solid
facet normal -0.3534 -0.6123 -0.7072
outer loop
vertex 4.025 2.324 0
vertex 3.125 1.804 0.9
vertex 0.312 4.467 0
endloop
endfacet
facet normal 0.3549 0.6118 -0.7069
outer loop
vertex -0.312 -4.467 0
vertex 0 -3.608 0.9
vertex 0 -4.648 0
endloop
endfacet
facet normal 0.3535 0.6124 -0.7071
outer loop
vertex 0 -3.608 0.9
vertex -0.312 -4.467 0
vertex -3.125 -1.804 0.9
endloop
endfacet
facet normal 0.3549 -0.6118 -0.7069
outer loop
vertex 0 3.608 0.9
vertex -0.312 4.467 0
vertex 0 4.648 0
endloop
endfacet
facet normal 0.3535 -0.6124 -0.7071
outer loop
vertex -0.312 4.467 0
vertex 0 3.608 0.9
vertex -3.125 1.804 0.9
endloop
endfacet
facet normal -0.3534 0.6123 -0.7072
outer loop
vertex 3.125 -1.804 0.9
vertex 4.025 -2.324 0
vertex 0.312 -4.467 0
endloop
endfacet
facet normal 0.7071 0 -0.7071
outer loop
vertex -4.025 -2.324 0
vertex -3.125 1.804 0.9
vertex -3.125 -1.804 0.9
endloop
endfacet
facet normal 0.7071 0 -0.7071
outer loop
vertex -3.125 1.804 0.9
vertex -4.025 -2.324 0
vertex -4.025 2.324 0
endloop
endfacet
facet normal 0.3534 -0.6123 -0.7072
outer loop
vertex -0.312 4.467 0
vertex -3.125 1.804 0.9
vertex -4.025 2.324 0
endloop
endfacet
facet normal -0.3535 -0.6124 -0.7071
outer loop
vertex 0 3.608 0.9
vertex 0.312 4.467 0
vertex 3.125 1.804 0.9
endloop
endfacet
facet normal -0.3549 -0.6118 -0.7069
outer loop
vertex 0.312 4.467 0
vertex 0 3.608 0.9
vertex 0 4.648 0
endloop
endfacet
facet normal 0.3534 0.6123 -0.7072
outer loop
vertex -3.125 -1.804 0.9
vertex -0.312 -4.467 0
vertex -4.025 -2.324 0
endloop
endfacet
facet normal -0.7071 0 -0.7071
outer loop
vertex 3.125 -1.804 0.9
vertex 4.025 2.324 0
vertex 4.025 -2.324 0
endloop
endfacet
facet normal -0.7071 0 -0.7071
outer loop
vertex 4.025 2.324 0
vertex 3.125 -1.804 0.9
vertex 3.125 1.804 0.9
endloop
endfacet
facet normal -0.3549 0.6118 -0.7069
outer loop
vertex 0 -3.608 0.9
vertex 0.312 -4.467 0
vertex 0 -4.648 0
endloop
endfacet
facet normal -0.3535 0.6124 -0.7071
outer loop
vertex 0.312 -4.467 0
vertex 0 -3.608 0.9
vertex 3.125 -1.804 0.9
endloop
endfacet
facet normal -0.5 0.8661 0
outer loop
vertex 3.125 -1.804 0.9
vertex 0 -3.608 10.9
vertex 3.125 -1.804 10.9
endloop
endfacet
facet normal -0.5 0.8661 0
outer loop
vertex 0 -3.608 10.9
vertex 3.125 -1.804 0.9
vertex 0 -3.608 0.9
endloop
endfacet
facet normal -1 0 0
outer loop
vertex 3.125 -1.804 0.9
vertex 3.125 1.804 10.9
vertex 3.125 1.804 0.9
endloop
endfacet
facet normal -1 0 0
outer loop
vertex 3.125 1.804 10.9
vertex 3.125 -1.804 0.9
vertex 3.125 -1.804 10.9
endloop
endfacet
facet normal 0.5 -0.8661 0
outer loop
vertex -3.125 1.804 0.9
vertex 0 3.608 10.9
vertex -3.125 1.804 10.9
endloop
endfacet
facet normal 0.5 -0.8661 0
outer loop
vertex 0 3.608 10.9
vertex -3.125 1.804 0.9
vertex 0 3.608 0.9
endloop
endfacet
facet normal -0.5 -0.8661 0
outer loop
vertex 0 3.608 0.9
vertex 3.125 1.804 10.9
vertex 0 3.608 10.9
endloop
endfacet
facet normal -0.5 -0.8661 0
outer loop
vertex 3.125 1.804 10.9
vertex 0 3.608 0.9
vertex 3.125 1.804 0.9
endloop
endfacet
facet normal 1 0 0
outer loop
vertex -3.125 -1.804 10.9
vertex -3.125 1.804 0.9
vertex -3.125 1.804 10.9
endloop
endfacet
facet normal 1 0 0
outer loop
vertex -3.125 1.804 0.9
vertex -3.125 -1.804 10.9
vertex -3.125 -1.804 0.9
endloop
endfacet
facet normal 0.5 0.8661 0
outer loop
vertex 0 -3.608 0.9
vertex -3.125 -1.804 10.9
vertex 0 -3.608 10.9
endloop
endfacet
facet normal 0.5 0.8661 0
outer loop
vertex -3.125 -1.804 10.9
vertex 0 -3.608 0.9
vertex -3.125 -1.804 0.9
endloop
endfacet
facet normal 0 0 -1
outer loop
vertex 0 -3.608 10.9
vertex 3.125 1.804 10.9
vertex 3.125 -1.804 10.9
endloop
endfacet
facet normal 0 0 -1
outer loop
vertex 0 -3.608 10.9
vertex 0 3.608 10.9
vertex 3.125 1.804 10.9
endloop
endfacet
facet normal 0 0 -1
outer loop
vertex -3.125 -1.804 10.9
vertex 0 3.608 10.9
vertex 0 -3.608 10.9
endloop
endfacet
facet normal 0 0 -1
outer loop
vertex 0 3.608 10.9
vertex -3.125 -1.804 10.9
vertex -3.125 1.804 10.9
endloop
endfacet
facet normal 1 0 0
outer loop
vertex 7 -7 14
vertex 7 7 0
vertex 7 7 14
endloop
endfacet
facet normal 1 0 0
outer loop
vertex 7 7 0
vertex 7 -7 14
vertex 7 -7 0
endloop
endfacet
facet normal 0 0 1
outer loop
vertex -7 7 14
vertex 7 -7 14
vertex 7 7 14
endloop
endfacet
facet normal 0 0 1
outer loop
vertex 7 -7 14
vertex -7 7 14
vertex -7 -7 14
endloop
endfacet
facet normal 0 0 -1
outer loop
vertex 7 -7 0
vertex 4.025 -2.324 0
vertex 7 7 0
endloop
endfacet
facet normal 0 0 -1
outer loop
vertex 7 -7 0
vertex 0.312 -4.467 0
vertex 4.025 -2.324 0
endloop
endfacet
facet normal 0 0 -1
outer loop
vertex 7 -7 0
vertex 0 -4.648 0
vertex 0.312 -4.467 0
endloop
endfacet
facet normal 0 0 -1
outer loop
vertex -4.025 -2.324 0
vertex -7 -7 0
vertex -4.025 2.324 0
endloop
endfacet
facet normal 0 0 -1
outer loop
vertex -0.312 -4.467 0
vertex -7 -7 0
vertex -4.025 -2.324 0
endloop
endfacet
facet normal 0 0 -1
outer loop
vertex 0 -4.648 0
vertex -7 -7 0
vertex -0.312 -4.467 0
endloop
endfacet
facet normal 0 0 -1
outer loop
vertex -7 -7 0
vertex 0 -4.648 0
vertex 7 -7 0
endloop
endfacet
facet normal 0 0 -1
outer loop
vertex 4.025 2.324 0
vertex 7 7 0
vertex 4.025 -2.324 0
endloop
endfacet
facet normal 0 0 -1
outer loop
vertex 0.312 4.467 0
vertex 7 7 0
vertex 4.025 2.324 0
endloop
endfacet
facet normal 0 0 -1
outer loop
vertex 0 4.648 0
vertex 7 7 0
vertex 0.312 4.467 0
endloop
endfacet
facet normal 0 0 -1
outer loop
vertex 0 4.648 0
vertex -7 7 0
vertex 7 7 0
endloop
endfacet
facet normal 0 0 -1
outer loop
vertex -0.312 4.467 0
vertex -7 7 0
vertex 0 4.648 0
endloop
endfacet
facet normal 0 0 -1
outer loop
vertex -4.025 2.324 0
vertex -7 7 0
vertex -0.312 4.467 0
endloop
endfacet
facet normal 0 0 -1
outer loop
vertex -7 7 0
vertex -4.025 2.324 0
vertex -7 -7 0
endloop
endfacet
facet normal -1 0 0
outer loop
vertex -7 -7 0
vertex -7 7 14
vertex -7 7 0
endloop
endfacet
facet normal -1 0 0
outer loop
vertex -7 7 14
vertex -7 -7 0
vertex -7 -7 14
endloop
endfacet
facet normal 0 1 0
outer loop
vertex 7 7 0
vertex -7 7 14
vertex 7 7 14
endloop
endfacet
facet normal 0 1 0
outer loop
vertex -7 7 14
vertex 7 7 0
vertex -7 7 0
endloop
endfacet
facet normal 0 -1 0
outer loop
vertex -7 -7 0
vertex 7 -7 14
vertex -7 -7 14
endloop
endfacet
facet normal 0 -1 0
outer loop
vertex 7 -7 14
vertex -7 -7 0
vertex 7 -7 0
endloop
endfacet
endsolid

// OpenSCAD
// file: ../utilities/functions_ext.scad
// Funciones sacadas de otras librerías y de diferentes autores

include <constants_oblomobka.scad>

/* A circular helix of radius a and pitch 2πb is described by the following parametrisation:
x(t) = a*cos(t),
y(t) = a*sin(t),
z(t) = b*t
Licensed under the MIT license.
© 2010 by Elmo Mäntynen
*/
function b(pitch) = pitch/(TAU);
function t(pitch, z) = z/b(pitch);
function helix_curve(pitch, radius, z) = [radius*cos(deg(t(pitch, z))), radius*sin(deg(t(pitch, z))), z];


/* Utility functions.
 * Originally by Hans Häggström, 2010.
 * Dual licenced under Creative Commons Attribution-Share Alike 3.0 and LGPL2 or later
 */
function distance(a, b) = sqrt( (a[0] - b[0])*(a[0] - b[0]) +
                                (a[1] - b[1])*(a[1] - b[1]) +
                                (a[2] - b[2])*(a[2] - b[2]) );

function length2(a) = sqrt( a[0]*a[0] + a[1]*a[1] );

function normalized(a) = a / (max(distance([0,0,0], a), 0.00001));

function normalized_axis(a) = 	a == "x" ? [1, 0, 0]:
                  			 	a == "y" ? [0, 1, 0]:
                   				a == "z" ? [0, 0, 1]: normalized(a);

function angleOfNormalizedVector(n) = [0, -atan2(n[2], length2([n[0], n[1]])), atan2(n[1], n[0]) ];

function angle(v) = angleOfNormalizedVector(normalized(v));

function angleBetweenTwoPoints(a, b) = angle(normalized(b-a));
// file: ../utilities/shapes_oblomobka.scad
// Shapes
// (C) @oblomobka - 2014
// GPL3

include <constants_oblomobka.scad>
include <functions_oblomobka.scad>
include <functions_ext.scad>

use <transformations_oblomobka.scad>

// --- Piramide con base circunscrita en un círculo definido en las variables
module pyramid_circumscribed (	n=4,			// nº lados de la base de la pirámide	
								d1=20,		// diámetro del círculo-base donde se circunscribe la pirámide
								d2=0,		// diámetro del círculo-punta donde se circunscribe la pirámide
								h=10			// altura de la pirámide
								){

if(n%2==0){
	rotate([0,0,180/n])
		cylinder (r1=d1/2/cos(180/n), r2=d2/2/cos(180/n), h=h, $fn=n);
	}
	else{
		rotate([0,0,90/n])
			cylinder (r1=d1/2/cos(180/n), r2=d2/2/cos(180/n), h=h, $fn=n);
		}

}
// ------- pyramid_circumscribed (n=n,d1=d1,d2=d2,h=h); -----------------

// --- Prisma con base circunscrita en un círculo definido en las variables
module prism_circumscribed (	n=4,			// nº lados de la base del prisma
							d=20,		// diámetro del círculo donde se circunscribe el prisma
							h=10			// altura del prisma
							){
if(n%2==0){
	rotate([0,0,180/n])
		cylinder (r=d/2/cos(180/n), h=h, $fn=n);
	}
	else{
		rotate([0,0,90/n])
			cylinder (r=d/2/cos(180/n), h=h, $fn=n);
		}
}
// ------- prism_circumscribed (n=n,d=d,h=h); -----------------



// Toros

// Definido por el diámetro exterior y el diámetro del círculo en revolución
module torusOD (d1,d2,resolution){
$fn=resolution;	
rotate_extrude(){
	translate([d1/2-d2/2,0,0])
		circle(r=d2/2);
	}
}

// Definido por el diámetro exterior y el diámetro interior
module torusOI (d1,d2,resolution){
$fn=resolution;	
d=(d1-d2)/2;
rotate_extrude(){
	translate([d1/2-d/2,0,0])
		circle(r=d/2);
	}
}

// Definido por el diámetro de la línea neutra y el diámetro del círculo en revolución
module torusND (d1,d2,resolution){
$fn=resolution;	
rotate_extrude(){
	translate([d1/2,0,0])
		circle(r=d2/2);
	}
}

module torus_sector(d1,d2,angle=360,mode=1,extreme=true,resolution=32){

if(angle<=0 || angle>=360){
	if(mode==1){torusOD(d1,d2,resolution=resolution);}
	else{if(mode==2){torusND(d1,d2,resolution=resolution);}
	else{if(mode==3){torusOI(d1,d2,resolution=resolution);}}}
	}

else{
	if(mode==1){
		union(){
			sector(angle,d1,d2/2)torusOD(d1,d2,resolution=resolution);
			if(extreme==true){
				translate([d1/2-d2/2,0,0])sphere(d2/2,$fn=resolution);
				translate([(d1/2-d2/2)*cos(angle),(d1/2-d2/2)*sin(angle),0])sphere(d2/2,$fn=resolution);
				}
			}
		}
	else{
		if(mode==2){
			union(){
				sector(angle,d1+d2,d2/2)torusND(d1,d2,resolution=resolution);
				if(extreme==true){
					translate([d1/2,0,0])sphere(d2/2,$fn=resolution);
					translate([d1/2*cos(angle),d1/2*sin(angle),0])sphere(d2/2,$fn=resolution);
					}
				}
			}
		else{
			if(mode==3){
				union(){
					sector(angle,d1,(d1-d2)/4)torusOI(d1,d2,resolution=resolution);
					if(extreme==true){
						translate([d1/2-(d1-d2)/4,0,0])sphere((d1-d2)/4,$fn=resolution);
						translate([(d1/2-(d1-d2)/4)*cos(angle),(d1/2-(d1-d2)/4)*sin(angle),0])sphere((d1-d2)/4,$fn=resolution);
						}
					}
				}
			}
		}
	}
}


// Tubos

module tubeOT (d,t,h,resolution=resolution){	
	difference(){
		cylinder(r=d/2,h=h,$fn=resolution);
		cylinder(r=(d-2*t)/2,h=3*h,center=true,$fn=resolution);
		}
}

// Definido por el diámetro exterior y el diámetro interior
module tubeOI (d1,d2,h,resolution=resolution){
	difference(){
		cylinder(r=d1/2,h=h,$fn=resolution);
		cylinder(r=d2/2,h=3*h,center=true,$fn=resolution);	
		}
}

// Definido por el diámetro de la línea neutra y el diámetro del círculo en revolución
module tubeNT (d,t,h,resolution=resolution){
	difference(){
		cylinder(r=(d+t)/2,h=h,$fn=resolution);
		cylinder(r=(d-t)/2,h=3*h,center=true,$fn=resolution);
	}
}

module tube_sector(d=25,t=2,h=1,angle=360,mode=1,extreme=true,resolution=32){

if(angle<=0 || angle>=360){
	if(mode==1){tubeOT(d,t,h,resolution=resolution);}
	else{if(mode==2){tubeNT(d,t,h,resolution=resolution);}
	else{if(mode==3){tubeOI(d,t,h,resolution=resolution);}}}
	}

else{
	if(mode==1){
		union(){
			sector(angle,d,h)tubeOT(d,t,h,resolution=resolution);
			if(extreme==true){
				translate([d/2-t/2,0,0])cylinder(r=t/2,h=h,$fn=resolution);
				translate([(d/2-t/2)*cos(angle),(d/2-t/2)*sin(angle),0])cylinder(r=t/2,h=h,$fn=resolution);;
				}
			}
		}
	else{
		if(mode==2){
			union(){
				sector(angle,d+t,h)tubeNT(d,t,h,resolution=resolution);
				if(extreme==true){
					translate([d/2,0,0])cylinder(r=t/2,h=h,$fn=resolution);
					translate([d/2*cos(angle),d/2*sin(angle),0])cylinder(r=t/2,h=h,$fn=resolution);
					}
				}
			}
		else{
			if(mode==3){
				union(){
					sector(angle,d,h)tubeOI(d,t,h,resolution=resolution);
					if(extreme==true){
						translate([d/2-(d-t)/4,0,0])cylinder(r=(d-t)/4,h=h,$fn=resolution);
						translate([(d/2-(d-t)/4)*cos(angle),(d/2-(d-t)/4)*sin(angle),0])cylinder(r=(d-t)/4,h=h,$fn=resolution);
						}
					}
				}
			}
		}
	}
}

//torus_sector(d1=15,d2=4,angle=215,mode=3,extreme=true,resolution=50);
//tube_sector(d=24,t=11,h=15,angle=250,mode=1,extreme=true,resolution=50);

pyramid_circumscribed(n=10,d=8,h=4);
// file: ../utilities/transformations_oblomobka.scad
// Transformations
// (C) @oblomobka - 2014
// GPL3

// Transforma una forma en un sector según un ángulo dado.

module sector(	angle, 	// es el ángulo del sector, lo que quedará de la forma original
				d,		// valor auxiliar, será como mínimo igual al diámetro del cilindro que envuelve la forma original
				h		// valor auxiliar, será como mínimo igual a la altura del cilindro que envuelve la forma original
				){

POINTS=[	[0,0,-h],
		[0,0,h],
		[d*cos(0*angle/4),d*sin(0*angle/4),-h],
		[d*cos(0*angle/4),d*sin(0*angle/4),h],
		[d*cos(1*angle/4),d*sin(1*angle/4),-h],
		[d*cos(1*angle/4),d*sin(1*angle/4),h],
		[d*cos(2*angle/4),d*sin(2*angle/4),-h],
		[d*cos(2*angle/4),d*sin(2*angle/4),h],
		[d*cos(3*angle/4),d*sin(3*angle/4),-h],
		[d*cos(3*angle/4),d*sin(3*angle/4),h],
		[d*cos(4*angle/4),d*sin(4*angle/4),-h],
		[d*cos(4*angle/4),d*sin(4*angle/4),h],
		];

TRIANGLES=[	[0,1,2],
			[1,3,2],
			[2,3,4],
			[3,5,4],
			[4,5,6],
			[5,7,6],
			[6,7,8],
			[7,9,8],
			[8,9,10],
			[9,11,10],
			[10,11,0],
			[11,1,0],

			[5,3,1],
			[7,5,1],
			[9,7,1],
			[11,9,1],
			[0,2,4],
			[0,4,6],
			[0,6,8],
			[0,8,10]
			];

if(angle<=0 || angle>=360){
	child();
	}
	else{
		intersection(){
			polyhedron(points=POINTS,triangles=TRIANGLES);
			child();
			}
		}
}

//sector (150,40,10)cylinder(r=20,h=10); // Ejemplo de uso de la tansformación sector()
// file: ../utilities/functions_oblomobka.scad
// Functions
// (C) @oblomobka - 2014
// GPL3

include <constants_oblomobka.scad>

// da el diámetro interior del cono(d1,d2,h) a una altura interior(hi) conocida
function di_cone(d1,d2,h,hi)=d2+(d1-d2)*(1-hi/h);

// da la altura interior del cono(d1,d2,h) a un diametro(di) conocido
function hi_cone(d1,d2,h,di)=-h*((di-d2)/(d1-d2)-1);

// 
function r_circle_intersection (d1,d2)=sqrt(pow(d1/2,2)-pow(d2/2,2));

// Relaciones entre radio, apotema y lado en un polígono de n lados
function side_apothem (apothem,n)=apothem*2*tan(180/n);
function apothem_radius(radius,n)=radius*cos(180/n);
function radius_apothem(apothem,n)=apothem/cos(180/n);
function side_radius (radius,n)=radius*2*sin(180/n);

// limita los posibles valores de x, que siempre estarán comprendidos entre un minimo(a) y un maximo(z)
function lim(a,x,z)=max(a,min(x,z));

// transforma angulo, radianes --> hexadecimal
function deg(angle) = 180*angle/PI;
// transforma angulo, hexadecimal --> radianes
function rad(angle) = angle*PI/180;
// file: ../utilities/limits_oblobots.scad
//PIN
	d_pin_minmax=[10,30];			//	d_pin=lim(d_pin_minmax[0],pin[0],d_pin_minmax[1]);			
	h_pin_minmax=[0,10];			//	h_pin=lim(h_pin_minmax[0],pin[1],h_pin_minmax[1]);

//LEGS & FOOTS
	d_leg_minmax=[10,30];			//	d_leg=lim(d_leg_minmax[0],leg[0],d_leg_minmax[1]);
	h_leg_minmax=[20,90];			//	h_leg=lim(h_leg_minmax[0],leg[1],h_leg_minmax[1]);	
	n_leg_minmax=[4,16];			//	n_leg=lim(n_leg_minmax[0],leg[2],n_leg_minmax[1]);
	legsposition_minmax=[0,100];	// 	legsposition=lim(legsposition_minmax[0],leg[1],legsposition_minmax[1]);

	l_foot_minmax=[24,70];		//	l_foot=lim(l_foot_minmax[0],foot[0],l_foot_minmax[1]);
	h_foot_minmax=[0,40];			//	h_foot=lim(h_foot_minmax[0],foot[1],h_foot_minmax[1]);

//HIP | WAIST
	//C
	d_hip_minmax=[25,80];			//	d_hip=lim(d_hip_minmax[0],hip[0],d_hip_minmax[1]);
	h_hip_minmax=[10,70];			//	h_hip=lim(h_pin+2,hip[1],h_hip_minmax[1]);
	f_hip_minmax=[0,100];			//	f_hip=lim(f_hip_minmax[0],hip[2],f_hip_minmax[1]);

								//	d1_waist=lim(d_pin,waist[0],d_hip);
								//	d2_waist=lim(d_pin,waist[1],d1_waist);
	h_waist_minmax=[0.3,20];		//	h_waist=lim(h_waist_minmax[0],waist[2],h_waist_minmax[1]);

	
	//Q
	x_hip_minmax=[20,90];			//	x_hip=lim(x_hip_minmax[0],hip[0],x_hip_minmax[1]);
	y_hip_minmax=[20,60];			//	y_hip=lim(y_hip_minmax[0],hip[1],y_hip_minmax[1]);
	z_hip_minmax=[10,60];			//	z_hip=lim(z_hip_minmax[0],hip[2],z_hip_minmax[1]);
	bevel_hip_minmax=[0.5,20];	//	bevel_hip=lim(bevel_hip_minmax[0],hip[3],bevel_hip_minmax[1]);

	n_waist_minmax=[4,50];		//	n_waist=lim(n_waist_minmax[0],waist[3],n_waist_minmax[1]);
								//	d1_waist=lim(d_pin,waist[0],min(x_hip,y_hip));
								//	d2_waist=lim(d_pin,waist[1],d1_waist);


//TRUNK | SHOULDER | NECK
	//C
	d1_trunk_minmax=[30,100];		//	d1_trunk=lim(d1_trunk_minmax[0],trunk[0],d1_trunk_minmax[1]); 
	d2_trunk_minmax=[30,100];		//	d2_trunk=lim(d2_trunk_minmax[0],trunk[1],d1_trunk);
	h_trunk_minmax=[24,100];		//	h_trunk=lim(h_trunk_minmax[0],trunk[2],h_trunk_minmax[1]);

	d1_shoulder_minmax=[12,50];	//	d1_shoulder=lim(d1_shoulder_minmax[0],shoulder[0],h_trunk*sin(angle_trunk));
	d_aux_shoulder_minmax=[0,10];	//	d_aux_shoulder=lim(d_aux_shoulder_minmax[0],shoulder[1],d_aux_shoulder_minmax[1]);
	h_shoulder_minmax=[0,50];		//	h_shoulder=lim(h_shoulder_minmax[0],shoulder[2],d2_trunk/2);

								//	d1_neck=lim(d_pin+2,neck[0],d2_trunk);
								//	d2_neck=lim(d_pin+2,neck[1],d1_neck);
	h_neck_minmax=[0.3,20];		//	h_neck=lim(h_neck_minmax[0],neck[2],h_neck_minmax[1]);

	//Q
	x_trunk_minmax=[20,90];		//	x_trunk=lim(x_trunk_minmax[0],trunk[0],x_trunk_minmax[1]);
	y_trunk_minmax=[20,90];		//	y_trunk=lim(d_pin+1+x_trunk/5,trunk[1],y_trunk_minmax[1]);
	z_trunk_minmax=[26,90];		//	z_trunk=lim(z_trunk_minmax[0],trunk[2],z_trunk_minmax[1]);
	
	n_neck_minmax=[4,50];			//	n_neck=lim(n_neck_minmax[0],neck[3],n_neck_minmax[1]);
								//	d1_neck=lim(d_pin+2,neck[0],min(x_trunk,y_trunk));	
								//	d2_neck=lim(d_pin+2,neck[1],d1_neck);

	//ELECTRIC TRUNK
	d_polygonal_trunk_minmax=[45,80];	//d_polygonal_trunk=lim(d_polygonal_trunk_minmax[0],trunk[0],d_polygonal_trunk_minmax[1]);							
	h_polygonal_trunk_minmax=[87,120];	//h_polygonal_trunk=lim(h_polygonal_trunk_minmax[0],trunk[1],h_polygonal_trunk_minmax[1]);
	thickness_trunk_minmax=[1,6];	//thickness_trunk=lim(thickness_trunk_minmax[0],trunk[2],thickness_trunk_minmax[1]);

// ARMS | HANDS
	// C
	d_arm_minmax=[10,40];			// 	d_arm=lim(d_arm_minmax[0],arm[0],d_arm_minmax[1]);
								//	d_arm=lim(d_pin+1,arm[0],d_arm_minmax[1]);	
	h_arm_minmax=[5,25];			// 	h_arm=lim(h_arm_minmax[0],arm[1],h_arm_minmax[1]);
	armpit_minmax=[0.3,60];		//	armpit=lim(armpit_minmax[0],arm[2],armpit_minmax[1]);
	l_arm_minmax=[20,120];		// 	l_arm=lim(d_arm+d_hand,arm[2],l_arm_minmax[1]);	

	d_hand_minmax=[10,60];		//	d_hand=lim(d_hand_minmax[0],hand[0],d_hand_minmax[1]);
	h_hand_minmax=[3,25];			//	h_hand=lim(h_hand_minmax[0],hand[1],h_arm-0.5);
	angle_hand_minmax=[0,180];	//	angle_hand=lim(angle_hand_minmax[0],hand[2]/2,angle_hand_minmax[1]);

	// Q
	x_arm_minmax=[5,25];			// 	x_arm=lim(x_arm_minmax[0],arm[1],x_arm_minmax[1]);
	y_arm_minmax=[10,40];			// 	y_arm=lim(y_arm_minmax[0],arm[0],y_arm_minmax[1]);
	z_arm_minmax=[20,120];		//	z_arm=lim(y_arm+5+d_hand,arm[2],z_arm_minmax[1]);

	n_hand_minmax=[4,12];			// 	n_hand=lim(n_hand_minmax[0],2*floor(hand[2]/2),n_hand_minmax[1]);
								//	h_hand=lim(h_hand_minmax[0],hand[1],x_arm-0.5);

// HEAD | EYES | BRAIN
	// C
	h_head_minmax=[20,100];		// 	h_head=lim(h_head_minmax[0],head[2],h_head_minmax[1]);
	d1_head_minmax=[20,60];		// 	d1_head=lim(h_head_minmax[0],head[0],h_head_minmax[1]);
	d2_head_minmax=[15,150];		// 	d2_head=lim(h_head_minmax[0],head[1],2*h_head+d1_head);

	// Q
	x_head_minmax=[20,100];		// x_head=lim(x_head_minmax[0],head[0],x_head_minmax[1]);
	y_head_minmax=[20,100];		// y_head=lim(y_head_minmax[0],head[1],y_head_minmax[1]);
	z_head_minmax=[20,100];		// z_head=lim(z_head_minmax[0],head[2],z_head_minmax[1]);

	d_eye_minmax=[5,40];			// 	d_eye=lim(d_eye_minmax[0],eye[0],(d1_head+d2_head)/2);
	h_eye_minmax=[1,10];			// 	h_eye=lim(h_eye_minmax[0],eye[1],h_eye_minmax[1]);
	edge_eye_minmax=[1,12];		//	edge_eye=lim(edge_eye_minmax[0],eye[2],d_eye/2-3);

	frown_eye_expression_minmax=[0,100];		// frown_eye_expression=lim(frown_eye_expression_minmax[0],eye_expression[1],frown_eye_expression_minmax[1]);
	bridge_eye_position_minmax=[0,100];		// bridge_eye_position=lim(bridge_eye_position_minmax[0],eye_position[0],bridge_eye_position_minmax[1]);	
	f_h_eye_position_minmax=[0,100];			// f_h_eye_position=lim(f_h_eye_position_minmax[0],eye_position[1],f_h_eye_position_minmax[1]);	

	h_brain_minmax=[0,40];			//	h_brain=lim(h_brain_minmax[0],brain[0],h_brain_minmax[1]);
	edge_brain_minmax=[0,25];			//	edge_brain=lim(edge_brain_minmax[0],brain[1],edge_brain_minmax[1]);

//BADGE
	d_badge_minmax=[20,40];		//	d_badge=lim(d_badge_minmax[0],badge[0],d_badge_minmax[1])
	h_badge_minmax=[0.5,5];		// 	h_badge=lim(h_badge_minmax[0],badge[1],h_badge_minmax[1]);
	n_badge_minmax=[4,50];		// 	n_badge=lim(n_badge_minmax[0],badge[3],n_badge_minmax[1]);
	edge_badge_minmax=[1,5];		//	edge_badge=lim(edge_badge_minmax[0],badge[2],edge_badge_minmax[1]);
// file: ../utilities/external_elements_oblobots.scad
//////////////////////////////////////////////////////////////////////////////////////////////////
// external elements [OBLOBOTS] 
// librería de elementos externos comerciales (botones automáticos, espigas de madera baterías, ...) 
// que se usan en las partes de los oblobots
//////////////////////////////////////////////////////////////////////////////////////////////////
// (c) Jorge Medal (@oblomobka) - Sara Alvarellos (@trecedejunio) 2014-02
//////////////////////////////////////////////////////////////////////////////////////////////////
// GPL license
//////////////////////////////////////////////////////////////////////////////////////////////////

//-- BOTONES AUTOMÁTICOS - Press Fastener (PF)
//-- Cada código corresponde a las medidas de un modelo concreto

//XXX= [ xx,xx,xx,xx,xx,xx,xx ];		// [ 	diametro hembra,
									//		espesor hembra,
									//		diámetro alojamiento en hembra (aparece en los botones para coser),
									//		saliente del alojamiento en hembra (aparece en los botones para coser),
									//		diámetro macho,
									//		espesor macho	
									//		tipo]

NULL=[0,0,0,0,0,0,0];				// no hay botón automático 
//PON = [11.7,2.35,0,0,11.7,1.6 ];	// marca desconocida, encontrado en Pontejos (Madrid)
//PRYM10 = [11,2.2,0,0,11,2.0];		// marca PRYM - 10 mm
PRYM_SNAP_FASTENERS_11 = [10.1,1.4,3.5,3,9.1,1,2];	// marca PRYM - Snap fasteners 11mm
PRYM_SNAP_FASTENERS_9 = [8.5,1.5,3,2.7,8.1,1,2];	// marca PRYM - Snap fasteners 9mm

fit_male=0.7;

//-- Espigas de madera - DOWEL

DOWEL_8=[8,40,0,0,0,0,1];
DOWEL_6=[6,30,0,0,0,0,1];

//-- TUBOS DE PLÁSTICO

PIPE_6=[6,20,0,0,0,0,1];



//-- BATERÍAS CILÍNDRICAS

//XX= [ xx,xx ];		// [ 	diametro de la pila,
					//		longitud	de la pila	]

AA = [ 14.5, 50.5 ];
AAA = [ 10.5,44.5 ];
C = [ 26.2, 50 ];
D = [ 34.2, 61.5 ]; 
// file: ../utilities/constants_oblomobka.scad
// números transcendentes

TAU = 2*PI; //6.2831853071 (PI ya está definido en Openscad)
EULER=2.71828282;


// números algebraicos

PHI=(1+sqrt(5))/2;


// Vectores

X = [1, 0, 0];
Y = [0, 1, 0];
Z = [0, 0, 1];
// main file
//////////////////////////////////////////////////////////////////////////////////////////////////
// gap [OBLOBOTS] 
// 
//////////////////////////////////////////////////////////////////////////////////////////////////
// (c) Jorge Medal (@oblomobka) - Sara Alvarellos (@trecedejunio) 2014-04 - v.10
//////////////////////////////////////////////////////////////////////////////////////////////////
// GPL license
//////////////////////////////////////////////////////////////////////////////////////////////////

include <../utilities/constants_oblomobka.scad>
include <../utilities/external_elements_oblobots.scad>
include <../utilities/limits_oblobots.scad>

use <../utilities/functions_oblomobka.scad>
use <../utilities/transformations_oblomobka.scad>
use <../utilities/shapes_oblomobka.scad>



//////////////////////////////////////////////////////
////////// MÓDULOS TIPO BOTÓN AUTOMÁTICO /////////////

layer=0.3;
edge=0.3;

////////// HEMBRAS ////////////////////

module gap (gap=DOWEL_6, deep=15, play=0){								
$fn=6;

h=gap[1];
d=gap[0]+0.25+play;

translate([0,0,-0.1])
	union(){
		pyramid_circumscribed (d1=d+2,d2=d,h=1,n=6);
		translate([0,0,0.9])
			prism_circumscribed (d=d,h=deep+0.1,n=6);
		}	
}


// ------ Ejemplos de alojamiento para botones automáticos ----------------


lado=14;
$fn=50;

difference(){
	translate([0,0,lado/2])
		cube([lado,lado,lado],center=true);
	gap(gap=DOWEL_6,deep=PIPE_6[1]/2,play=0);
}
